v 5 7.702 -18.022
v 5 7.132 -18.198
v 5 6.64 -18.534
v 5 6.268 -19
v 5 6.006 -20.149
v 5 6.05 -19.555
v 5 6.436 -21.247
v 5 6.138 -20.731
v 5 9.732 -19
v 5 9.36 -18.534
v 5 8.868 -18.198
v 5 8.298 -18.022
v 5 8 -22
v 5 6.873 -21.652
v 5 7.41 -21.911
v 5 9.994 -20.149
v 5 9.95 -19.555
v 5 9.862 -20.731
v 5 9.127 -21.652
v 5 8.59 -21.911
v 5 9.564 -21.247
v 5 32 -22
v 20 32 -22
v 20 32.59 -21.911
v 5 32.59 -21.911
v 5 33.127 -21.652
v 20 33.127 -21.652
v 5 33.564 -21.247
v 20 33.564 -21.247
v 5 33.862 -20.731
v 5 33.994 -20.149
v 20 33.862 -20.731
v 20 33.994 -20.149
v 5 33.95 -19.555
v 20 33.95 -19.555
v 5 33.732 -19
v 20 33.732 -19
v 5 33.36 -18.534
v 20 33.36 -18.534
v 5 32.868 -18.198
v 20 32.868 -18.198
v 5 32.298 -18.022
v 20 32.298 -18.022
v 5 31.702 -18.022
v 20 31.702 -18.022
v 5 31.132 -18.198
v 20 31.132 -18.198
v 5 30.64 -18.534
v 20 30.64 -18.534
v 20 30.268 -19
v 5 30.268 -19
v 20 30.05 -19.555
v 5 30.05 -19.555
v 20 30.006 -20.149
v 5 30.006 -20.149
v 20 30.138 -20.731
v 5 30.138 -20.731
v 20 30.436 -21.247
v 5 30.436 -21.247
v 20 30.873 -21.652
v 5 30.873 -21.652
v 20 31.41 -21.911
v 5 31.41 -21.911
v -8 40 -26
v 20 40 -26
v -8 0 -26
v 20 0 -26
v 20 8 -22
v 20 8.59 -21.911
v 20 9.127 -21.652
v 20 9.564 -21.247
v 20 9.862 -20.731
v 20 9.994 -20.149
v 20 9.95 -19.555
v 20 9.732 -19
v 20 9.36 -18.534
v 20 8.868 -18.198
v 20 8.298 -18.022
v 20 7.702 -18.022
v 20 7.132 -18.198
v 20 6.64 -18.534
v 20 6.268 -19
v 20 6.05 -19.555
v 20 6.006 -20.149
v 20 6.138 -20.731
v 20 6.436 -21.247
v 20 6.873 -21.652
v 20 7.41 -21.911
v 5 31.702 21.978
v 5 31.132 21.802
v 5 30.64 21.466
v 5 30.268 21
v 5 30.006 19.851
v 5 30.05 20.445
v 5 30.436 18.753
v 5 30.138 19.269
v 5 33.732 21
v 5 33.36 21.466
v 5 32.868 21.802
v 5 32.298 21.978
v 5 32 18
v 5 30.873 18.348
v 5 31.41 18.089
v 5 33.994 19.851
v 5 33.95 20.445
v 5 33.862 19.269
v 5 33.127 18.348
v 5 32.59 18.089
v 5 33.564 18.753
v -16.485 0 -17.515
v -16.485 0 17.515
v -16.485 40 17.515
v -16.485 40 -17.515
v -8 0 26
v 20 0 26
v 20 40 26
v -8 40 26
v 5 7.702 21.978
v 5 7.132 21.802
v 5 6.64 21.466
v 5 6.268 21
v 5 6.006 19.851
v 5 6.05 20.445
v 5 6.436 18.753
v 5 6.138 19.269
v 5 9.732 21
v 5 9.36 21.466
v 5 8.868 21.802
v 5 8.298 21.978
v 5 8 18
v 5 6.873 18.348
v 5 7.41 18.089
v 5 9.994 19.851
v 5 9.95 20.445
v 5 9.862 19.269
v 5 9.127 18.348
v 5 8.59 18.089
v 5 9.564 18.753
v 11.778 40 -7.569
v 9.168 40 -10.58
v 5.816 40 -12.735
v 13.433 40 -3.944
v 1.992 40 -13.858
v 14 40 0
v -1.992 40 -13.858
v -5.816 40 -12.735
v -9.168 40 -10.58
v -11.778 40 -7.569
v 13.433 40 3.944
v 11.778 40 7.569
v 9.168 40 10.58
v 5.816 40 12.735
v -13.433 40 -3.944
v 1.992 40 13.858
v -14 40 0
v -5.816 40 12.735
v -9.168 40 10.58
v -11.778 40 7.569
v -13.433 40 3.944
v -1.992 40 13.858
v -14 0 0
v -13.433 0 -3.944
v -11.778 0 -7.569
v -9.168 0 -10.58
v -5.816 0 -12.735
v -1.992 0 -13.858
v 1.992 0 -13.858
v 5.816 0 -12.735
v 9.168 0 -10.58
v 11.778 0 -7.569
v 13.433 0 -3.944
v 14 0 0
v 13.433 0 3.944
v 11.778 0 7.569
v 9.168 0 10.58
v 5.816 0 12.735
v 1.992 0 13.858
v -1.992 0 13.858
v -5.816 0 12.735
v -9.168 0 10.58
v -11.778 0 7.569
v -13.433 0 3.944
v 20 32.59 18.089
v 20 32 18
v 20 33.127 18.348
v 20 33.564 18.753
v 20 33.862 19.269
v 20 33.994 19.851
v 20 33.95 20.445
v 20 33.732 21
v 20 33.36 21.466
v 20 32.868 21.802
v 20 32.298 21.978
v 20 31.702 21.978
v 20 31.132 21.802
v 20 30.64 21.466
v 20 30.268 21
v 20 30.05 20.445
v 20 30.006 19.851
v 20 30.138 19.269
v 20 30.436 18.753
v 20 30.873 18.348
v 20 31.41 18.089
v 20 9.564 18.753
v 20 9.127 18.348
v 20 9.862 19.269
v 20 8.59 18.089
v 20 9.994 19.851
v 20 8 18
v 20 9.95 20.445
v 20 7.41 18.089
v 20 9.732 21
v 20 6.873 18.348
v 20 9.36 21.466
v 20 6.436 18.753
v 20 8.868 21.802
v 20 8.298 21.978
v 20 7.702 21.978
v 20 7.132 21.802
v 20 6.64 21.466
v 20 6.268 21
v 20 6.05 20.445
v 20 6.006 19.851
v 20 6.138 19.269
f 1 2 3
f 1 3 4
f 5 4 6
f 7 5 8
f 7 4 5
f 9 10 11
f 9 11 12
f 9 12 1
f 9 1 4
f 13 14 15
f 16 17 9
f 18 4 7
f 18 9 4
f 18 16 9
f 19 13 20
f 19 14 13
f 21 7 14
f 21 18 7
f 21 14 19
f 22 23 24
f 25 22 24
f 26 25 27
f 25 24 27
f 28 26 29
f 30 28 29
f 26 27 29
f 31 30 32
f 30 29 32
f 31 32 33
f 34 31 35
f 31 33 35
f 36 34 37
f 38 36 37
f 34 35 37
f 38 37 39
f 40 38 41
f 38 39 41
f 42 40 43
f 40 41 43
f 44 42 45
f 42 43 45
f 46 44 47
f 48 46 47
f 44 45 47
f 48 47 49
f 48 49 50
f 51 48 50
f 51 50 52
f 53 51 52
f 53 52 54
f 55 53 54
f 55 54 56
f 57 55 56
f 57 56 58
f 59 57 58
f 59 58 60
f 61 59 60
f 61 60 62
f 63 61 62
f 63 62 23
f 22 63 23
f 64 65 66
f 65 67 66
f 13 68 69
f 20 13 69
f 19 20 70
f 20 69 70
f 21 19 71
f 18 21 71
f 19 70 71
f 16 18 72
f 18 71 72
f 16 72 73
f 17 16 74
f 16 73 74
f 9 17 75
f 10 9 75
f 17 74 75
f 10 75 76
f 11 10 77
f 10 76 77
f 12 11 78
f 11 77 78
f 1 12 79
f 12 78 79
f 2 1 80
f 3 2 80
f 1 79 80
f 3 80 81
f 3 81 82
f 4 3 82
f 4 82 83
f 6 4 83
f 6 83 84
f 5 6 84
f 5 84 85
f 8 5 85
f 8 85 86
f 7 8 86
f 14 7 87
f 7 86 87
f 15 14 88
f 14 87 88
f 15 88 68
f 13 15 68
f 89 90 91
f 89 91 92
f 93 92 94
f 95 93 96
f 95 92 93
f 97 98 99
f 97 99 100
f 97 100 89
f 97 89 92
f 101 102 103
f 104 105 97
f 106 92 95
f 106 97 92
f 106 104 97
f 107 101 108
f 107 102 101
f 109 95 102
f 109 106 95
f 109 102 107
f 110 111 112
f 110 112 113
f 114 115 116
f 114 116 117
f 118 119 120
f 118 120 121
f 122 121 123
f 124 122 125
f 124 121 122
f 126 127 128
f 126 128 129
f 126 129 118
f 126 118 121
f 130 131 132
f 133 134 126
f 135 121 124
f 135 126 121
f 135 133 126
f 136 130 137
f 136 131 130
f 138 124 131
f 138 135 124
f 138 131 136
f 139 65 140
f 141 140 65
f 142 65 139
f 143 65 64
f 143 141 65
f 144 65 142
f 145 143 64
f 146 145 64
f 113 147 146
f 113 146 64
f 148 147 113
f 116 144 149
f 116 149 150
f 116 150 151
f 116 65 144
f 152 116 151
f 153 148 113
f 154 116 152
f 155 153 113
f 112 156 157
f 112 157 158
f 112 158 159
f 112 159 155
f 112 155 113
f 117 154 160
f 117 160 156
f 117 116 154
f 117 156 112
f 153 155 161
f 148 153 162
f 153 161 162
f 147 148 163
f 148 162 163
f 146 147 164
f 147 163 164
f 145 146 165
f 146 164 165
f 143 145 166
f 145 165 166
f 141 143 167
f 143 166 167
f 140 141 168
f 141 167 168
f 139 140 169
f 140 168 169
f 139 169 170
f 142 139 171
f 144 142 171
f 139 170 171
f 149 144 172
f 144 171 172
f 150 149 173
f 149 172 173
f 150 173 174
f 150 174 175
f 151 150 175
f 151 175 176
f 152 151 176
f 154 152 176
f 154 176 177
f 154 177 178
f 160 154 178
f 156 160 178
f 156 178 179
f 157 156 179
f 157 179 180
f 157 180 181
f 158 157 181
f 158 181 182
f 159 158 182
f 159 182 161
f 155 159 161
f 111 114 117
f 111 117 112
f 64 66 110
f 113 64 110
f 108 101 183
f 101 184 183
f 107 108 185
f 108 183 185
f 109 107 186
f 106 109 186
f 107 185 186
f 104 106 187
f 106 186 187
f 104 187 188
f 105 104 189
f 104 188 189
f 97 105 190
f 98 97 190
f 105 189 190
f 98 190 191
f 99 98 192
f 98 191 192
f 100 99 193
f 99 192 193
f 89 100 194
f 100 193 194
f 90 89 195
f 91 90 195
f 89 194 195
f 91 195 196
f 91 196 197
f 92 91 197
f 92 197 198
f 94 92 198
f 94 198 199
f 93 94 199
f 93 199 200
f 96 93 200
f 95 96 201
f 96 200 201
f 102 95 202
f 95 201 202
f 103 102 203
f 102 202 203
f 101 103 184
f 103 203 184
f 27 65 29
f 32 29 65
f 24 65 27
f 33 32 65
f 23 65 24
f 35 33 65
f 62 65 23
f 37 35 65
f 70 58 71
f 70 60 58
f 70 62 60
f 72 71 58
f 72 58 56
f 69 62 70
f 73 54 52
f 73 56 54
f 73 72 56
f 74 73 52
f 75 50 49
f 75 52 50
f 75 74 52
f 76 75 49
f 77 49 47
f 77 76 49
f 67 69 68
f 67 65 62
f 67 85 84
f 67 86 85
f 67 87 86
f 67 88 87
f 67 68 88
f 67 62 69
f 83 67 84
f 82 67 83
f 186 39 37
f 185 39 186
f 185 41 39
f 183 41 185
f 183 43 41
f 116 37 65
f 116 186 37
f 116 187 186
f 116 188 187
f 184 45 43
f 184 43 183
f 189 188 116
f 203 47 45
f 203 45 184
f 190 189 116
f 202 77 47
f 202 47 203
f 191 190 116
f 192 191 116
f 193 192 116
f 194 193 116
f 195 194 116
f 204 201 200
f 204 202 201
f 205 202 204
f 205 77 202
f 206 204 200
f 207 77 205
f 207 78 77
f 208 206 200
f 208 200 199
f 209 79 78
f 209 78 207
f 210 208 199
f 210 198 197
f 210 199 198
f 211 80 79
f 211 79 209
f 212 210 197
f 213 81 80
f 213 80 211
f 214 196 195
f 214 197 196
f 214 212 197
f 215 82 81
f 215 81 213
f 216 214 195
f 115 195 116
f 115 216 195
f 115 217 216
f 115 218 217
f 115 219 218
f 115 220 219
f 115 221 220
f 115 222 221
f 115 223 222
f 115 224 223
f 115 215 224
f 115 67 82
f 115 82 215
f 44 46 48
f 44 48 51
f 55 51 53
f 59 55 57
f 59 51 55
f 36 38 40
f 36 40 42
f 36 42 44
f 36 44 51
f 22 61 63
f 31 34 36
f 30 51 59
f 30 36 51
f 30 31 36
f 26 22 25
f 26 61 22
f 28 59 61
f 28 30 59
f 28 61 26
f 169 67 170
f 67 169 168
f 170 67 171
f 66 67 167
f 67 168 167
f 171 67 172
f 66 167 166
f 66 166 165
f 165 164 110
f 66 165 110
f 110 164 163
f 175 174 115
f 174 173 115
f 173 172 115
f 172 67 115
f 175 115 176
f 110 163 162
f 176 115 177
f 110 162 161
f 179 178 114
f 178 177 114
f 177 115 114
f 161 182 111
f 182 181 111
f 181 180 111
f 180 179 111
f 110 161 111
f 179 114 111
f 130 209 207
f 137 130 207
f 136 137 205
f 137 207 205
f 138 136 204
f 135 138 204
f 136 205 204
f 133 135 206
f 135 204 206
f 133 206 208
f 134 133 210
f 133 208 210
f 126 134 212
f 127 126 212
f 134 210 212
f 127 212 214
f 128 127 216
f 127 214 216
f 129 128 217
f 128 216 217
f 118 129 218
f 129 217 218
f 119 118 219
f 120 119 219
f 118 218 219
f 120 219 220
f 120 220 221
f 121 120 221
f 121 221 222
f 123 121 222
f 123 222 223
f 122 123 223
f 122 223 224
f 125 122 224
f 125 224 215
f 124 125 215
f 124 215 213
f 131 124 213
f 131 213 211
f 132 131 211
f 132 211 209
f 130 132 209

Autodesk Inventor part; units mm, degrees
ref_plane "YZ Plane" through (0, 0, 0) normal (1, 0, 0) x (0, 1, 0)
ref_plane "XZ Plane" through (0, 0, 0) normal (0, 1, 0) x (-1, 0, 0)
ref_plane "XY Plane" through (0, 0, 0) normal (0, 0, 1) x (1, 0, 0)
sketch "Sketch1" plane through (0, 0, 0) normal (0, 1, 0) x (-1, 0, 0)
  circle A0 centre (0, 0) radius 14
  line L0 (0, 0) -> (-20, 0)
  line L1 (-20, 0) -> (-20, -26)
  line L2 (-20, -26) -> (8, -26)
  line L3 (8, -26) -> (16.4853, -17.5147)
  line L4 (-20, 0) -> (-20, 26)
  line L5 (-20, 26) -> (8, 26)
  line L6 (8, 26) -> (16.4853, 17.5147)
  line L7 (16.4853, 17.5147) -> (16.4853, -17.5147)
  dimension "d0" = 28
  dimension "d1" = 20
  dimension "d2" = 26
  dimension "d3" = 28
  dimension "d4" = 12
  dimension "d5" = 135
  dimension "d6" = 28
  dimension "d7" = 26
  dimension "d8" = 12
extrude "Extrusion1" add sketch "Sketch1" along normal blind 40
sketch "Sketch2" plane through (20, 0, 26) normal (1, 0, 0) x (0, 0, -1)
  line L0 (0, 0) -> (0, 40) projected
  line L1 (0, 40) -> (0, 32)
  circle A0 centre (6, 32) radius 2
  point P0 (26, 0)
  dimension "d11" = 8
  dimension "d13" = 4
extrude "Extrusion2" cut sketch "Sketch2" against normal blind 15
pattern_linear "Rectangular Pattern1" count 2 spacing 24 along (0, -1, 0) count 2 spacing 40 along (0, 0, -1) of "Extrusion2"
properties part number "Soporte Tuerca"
